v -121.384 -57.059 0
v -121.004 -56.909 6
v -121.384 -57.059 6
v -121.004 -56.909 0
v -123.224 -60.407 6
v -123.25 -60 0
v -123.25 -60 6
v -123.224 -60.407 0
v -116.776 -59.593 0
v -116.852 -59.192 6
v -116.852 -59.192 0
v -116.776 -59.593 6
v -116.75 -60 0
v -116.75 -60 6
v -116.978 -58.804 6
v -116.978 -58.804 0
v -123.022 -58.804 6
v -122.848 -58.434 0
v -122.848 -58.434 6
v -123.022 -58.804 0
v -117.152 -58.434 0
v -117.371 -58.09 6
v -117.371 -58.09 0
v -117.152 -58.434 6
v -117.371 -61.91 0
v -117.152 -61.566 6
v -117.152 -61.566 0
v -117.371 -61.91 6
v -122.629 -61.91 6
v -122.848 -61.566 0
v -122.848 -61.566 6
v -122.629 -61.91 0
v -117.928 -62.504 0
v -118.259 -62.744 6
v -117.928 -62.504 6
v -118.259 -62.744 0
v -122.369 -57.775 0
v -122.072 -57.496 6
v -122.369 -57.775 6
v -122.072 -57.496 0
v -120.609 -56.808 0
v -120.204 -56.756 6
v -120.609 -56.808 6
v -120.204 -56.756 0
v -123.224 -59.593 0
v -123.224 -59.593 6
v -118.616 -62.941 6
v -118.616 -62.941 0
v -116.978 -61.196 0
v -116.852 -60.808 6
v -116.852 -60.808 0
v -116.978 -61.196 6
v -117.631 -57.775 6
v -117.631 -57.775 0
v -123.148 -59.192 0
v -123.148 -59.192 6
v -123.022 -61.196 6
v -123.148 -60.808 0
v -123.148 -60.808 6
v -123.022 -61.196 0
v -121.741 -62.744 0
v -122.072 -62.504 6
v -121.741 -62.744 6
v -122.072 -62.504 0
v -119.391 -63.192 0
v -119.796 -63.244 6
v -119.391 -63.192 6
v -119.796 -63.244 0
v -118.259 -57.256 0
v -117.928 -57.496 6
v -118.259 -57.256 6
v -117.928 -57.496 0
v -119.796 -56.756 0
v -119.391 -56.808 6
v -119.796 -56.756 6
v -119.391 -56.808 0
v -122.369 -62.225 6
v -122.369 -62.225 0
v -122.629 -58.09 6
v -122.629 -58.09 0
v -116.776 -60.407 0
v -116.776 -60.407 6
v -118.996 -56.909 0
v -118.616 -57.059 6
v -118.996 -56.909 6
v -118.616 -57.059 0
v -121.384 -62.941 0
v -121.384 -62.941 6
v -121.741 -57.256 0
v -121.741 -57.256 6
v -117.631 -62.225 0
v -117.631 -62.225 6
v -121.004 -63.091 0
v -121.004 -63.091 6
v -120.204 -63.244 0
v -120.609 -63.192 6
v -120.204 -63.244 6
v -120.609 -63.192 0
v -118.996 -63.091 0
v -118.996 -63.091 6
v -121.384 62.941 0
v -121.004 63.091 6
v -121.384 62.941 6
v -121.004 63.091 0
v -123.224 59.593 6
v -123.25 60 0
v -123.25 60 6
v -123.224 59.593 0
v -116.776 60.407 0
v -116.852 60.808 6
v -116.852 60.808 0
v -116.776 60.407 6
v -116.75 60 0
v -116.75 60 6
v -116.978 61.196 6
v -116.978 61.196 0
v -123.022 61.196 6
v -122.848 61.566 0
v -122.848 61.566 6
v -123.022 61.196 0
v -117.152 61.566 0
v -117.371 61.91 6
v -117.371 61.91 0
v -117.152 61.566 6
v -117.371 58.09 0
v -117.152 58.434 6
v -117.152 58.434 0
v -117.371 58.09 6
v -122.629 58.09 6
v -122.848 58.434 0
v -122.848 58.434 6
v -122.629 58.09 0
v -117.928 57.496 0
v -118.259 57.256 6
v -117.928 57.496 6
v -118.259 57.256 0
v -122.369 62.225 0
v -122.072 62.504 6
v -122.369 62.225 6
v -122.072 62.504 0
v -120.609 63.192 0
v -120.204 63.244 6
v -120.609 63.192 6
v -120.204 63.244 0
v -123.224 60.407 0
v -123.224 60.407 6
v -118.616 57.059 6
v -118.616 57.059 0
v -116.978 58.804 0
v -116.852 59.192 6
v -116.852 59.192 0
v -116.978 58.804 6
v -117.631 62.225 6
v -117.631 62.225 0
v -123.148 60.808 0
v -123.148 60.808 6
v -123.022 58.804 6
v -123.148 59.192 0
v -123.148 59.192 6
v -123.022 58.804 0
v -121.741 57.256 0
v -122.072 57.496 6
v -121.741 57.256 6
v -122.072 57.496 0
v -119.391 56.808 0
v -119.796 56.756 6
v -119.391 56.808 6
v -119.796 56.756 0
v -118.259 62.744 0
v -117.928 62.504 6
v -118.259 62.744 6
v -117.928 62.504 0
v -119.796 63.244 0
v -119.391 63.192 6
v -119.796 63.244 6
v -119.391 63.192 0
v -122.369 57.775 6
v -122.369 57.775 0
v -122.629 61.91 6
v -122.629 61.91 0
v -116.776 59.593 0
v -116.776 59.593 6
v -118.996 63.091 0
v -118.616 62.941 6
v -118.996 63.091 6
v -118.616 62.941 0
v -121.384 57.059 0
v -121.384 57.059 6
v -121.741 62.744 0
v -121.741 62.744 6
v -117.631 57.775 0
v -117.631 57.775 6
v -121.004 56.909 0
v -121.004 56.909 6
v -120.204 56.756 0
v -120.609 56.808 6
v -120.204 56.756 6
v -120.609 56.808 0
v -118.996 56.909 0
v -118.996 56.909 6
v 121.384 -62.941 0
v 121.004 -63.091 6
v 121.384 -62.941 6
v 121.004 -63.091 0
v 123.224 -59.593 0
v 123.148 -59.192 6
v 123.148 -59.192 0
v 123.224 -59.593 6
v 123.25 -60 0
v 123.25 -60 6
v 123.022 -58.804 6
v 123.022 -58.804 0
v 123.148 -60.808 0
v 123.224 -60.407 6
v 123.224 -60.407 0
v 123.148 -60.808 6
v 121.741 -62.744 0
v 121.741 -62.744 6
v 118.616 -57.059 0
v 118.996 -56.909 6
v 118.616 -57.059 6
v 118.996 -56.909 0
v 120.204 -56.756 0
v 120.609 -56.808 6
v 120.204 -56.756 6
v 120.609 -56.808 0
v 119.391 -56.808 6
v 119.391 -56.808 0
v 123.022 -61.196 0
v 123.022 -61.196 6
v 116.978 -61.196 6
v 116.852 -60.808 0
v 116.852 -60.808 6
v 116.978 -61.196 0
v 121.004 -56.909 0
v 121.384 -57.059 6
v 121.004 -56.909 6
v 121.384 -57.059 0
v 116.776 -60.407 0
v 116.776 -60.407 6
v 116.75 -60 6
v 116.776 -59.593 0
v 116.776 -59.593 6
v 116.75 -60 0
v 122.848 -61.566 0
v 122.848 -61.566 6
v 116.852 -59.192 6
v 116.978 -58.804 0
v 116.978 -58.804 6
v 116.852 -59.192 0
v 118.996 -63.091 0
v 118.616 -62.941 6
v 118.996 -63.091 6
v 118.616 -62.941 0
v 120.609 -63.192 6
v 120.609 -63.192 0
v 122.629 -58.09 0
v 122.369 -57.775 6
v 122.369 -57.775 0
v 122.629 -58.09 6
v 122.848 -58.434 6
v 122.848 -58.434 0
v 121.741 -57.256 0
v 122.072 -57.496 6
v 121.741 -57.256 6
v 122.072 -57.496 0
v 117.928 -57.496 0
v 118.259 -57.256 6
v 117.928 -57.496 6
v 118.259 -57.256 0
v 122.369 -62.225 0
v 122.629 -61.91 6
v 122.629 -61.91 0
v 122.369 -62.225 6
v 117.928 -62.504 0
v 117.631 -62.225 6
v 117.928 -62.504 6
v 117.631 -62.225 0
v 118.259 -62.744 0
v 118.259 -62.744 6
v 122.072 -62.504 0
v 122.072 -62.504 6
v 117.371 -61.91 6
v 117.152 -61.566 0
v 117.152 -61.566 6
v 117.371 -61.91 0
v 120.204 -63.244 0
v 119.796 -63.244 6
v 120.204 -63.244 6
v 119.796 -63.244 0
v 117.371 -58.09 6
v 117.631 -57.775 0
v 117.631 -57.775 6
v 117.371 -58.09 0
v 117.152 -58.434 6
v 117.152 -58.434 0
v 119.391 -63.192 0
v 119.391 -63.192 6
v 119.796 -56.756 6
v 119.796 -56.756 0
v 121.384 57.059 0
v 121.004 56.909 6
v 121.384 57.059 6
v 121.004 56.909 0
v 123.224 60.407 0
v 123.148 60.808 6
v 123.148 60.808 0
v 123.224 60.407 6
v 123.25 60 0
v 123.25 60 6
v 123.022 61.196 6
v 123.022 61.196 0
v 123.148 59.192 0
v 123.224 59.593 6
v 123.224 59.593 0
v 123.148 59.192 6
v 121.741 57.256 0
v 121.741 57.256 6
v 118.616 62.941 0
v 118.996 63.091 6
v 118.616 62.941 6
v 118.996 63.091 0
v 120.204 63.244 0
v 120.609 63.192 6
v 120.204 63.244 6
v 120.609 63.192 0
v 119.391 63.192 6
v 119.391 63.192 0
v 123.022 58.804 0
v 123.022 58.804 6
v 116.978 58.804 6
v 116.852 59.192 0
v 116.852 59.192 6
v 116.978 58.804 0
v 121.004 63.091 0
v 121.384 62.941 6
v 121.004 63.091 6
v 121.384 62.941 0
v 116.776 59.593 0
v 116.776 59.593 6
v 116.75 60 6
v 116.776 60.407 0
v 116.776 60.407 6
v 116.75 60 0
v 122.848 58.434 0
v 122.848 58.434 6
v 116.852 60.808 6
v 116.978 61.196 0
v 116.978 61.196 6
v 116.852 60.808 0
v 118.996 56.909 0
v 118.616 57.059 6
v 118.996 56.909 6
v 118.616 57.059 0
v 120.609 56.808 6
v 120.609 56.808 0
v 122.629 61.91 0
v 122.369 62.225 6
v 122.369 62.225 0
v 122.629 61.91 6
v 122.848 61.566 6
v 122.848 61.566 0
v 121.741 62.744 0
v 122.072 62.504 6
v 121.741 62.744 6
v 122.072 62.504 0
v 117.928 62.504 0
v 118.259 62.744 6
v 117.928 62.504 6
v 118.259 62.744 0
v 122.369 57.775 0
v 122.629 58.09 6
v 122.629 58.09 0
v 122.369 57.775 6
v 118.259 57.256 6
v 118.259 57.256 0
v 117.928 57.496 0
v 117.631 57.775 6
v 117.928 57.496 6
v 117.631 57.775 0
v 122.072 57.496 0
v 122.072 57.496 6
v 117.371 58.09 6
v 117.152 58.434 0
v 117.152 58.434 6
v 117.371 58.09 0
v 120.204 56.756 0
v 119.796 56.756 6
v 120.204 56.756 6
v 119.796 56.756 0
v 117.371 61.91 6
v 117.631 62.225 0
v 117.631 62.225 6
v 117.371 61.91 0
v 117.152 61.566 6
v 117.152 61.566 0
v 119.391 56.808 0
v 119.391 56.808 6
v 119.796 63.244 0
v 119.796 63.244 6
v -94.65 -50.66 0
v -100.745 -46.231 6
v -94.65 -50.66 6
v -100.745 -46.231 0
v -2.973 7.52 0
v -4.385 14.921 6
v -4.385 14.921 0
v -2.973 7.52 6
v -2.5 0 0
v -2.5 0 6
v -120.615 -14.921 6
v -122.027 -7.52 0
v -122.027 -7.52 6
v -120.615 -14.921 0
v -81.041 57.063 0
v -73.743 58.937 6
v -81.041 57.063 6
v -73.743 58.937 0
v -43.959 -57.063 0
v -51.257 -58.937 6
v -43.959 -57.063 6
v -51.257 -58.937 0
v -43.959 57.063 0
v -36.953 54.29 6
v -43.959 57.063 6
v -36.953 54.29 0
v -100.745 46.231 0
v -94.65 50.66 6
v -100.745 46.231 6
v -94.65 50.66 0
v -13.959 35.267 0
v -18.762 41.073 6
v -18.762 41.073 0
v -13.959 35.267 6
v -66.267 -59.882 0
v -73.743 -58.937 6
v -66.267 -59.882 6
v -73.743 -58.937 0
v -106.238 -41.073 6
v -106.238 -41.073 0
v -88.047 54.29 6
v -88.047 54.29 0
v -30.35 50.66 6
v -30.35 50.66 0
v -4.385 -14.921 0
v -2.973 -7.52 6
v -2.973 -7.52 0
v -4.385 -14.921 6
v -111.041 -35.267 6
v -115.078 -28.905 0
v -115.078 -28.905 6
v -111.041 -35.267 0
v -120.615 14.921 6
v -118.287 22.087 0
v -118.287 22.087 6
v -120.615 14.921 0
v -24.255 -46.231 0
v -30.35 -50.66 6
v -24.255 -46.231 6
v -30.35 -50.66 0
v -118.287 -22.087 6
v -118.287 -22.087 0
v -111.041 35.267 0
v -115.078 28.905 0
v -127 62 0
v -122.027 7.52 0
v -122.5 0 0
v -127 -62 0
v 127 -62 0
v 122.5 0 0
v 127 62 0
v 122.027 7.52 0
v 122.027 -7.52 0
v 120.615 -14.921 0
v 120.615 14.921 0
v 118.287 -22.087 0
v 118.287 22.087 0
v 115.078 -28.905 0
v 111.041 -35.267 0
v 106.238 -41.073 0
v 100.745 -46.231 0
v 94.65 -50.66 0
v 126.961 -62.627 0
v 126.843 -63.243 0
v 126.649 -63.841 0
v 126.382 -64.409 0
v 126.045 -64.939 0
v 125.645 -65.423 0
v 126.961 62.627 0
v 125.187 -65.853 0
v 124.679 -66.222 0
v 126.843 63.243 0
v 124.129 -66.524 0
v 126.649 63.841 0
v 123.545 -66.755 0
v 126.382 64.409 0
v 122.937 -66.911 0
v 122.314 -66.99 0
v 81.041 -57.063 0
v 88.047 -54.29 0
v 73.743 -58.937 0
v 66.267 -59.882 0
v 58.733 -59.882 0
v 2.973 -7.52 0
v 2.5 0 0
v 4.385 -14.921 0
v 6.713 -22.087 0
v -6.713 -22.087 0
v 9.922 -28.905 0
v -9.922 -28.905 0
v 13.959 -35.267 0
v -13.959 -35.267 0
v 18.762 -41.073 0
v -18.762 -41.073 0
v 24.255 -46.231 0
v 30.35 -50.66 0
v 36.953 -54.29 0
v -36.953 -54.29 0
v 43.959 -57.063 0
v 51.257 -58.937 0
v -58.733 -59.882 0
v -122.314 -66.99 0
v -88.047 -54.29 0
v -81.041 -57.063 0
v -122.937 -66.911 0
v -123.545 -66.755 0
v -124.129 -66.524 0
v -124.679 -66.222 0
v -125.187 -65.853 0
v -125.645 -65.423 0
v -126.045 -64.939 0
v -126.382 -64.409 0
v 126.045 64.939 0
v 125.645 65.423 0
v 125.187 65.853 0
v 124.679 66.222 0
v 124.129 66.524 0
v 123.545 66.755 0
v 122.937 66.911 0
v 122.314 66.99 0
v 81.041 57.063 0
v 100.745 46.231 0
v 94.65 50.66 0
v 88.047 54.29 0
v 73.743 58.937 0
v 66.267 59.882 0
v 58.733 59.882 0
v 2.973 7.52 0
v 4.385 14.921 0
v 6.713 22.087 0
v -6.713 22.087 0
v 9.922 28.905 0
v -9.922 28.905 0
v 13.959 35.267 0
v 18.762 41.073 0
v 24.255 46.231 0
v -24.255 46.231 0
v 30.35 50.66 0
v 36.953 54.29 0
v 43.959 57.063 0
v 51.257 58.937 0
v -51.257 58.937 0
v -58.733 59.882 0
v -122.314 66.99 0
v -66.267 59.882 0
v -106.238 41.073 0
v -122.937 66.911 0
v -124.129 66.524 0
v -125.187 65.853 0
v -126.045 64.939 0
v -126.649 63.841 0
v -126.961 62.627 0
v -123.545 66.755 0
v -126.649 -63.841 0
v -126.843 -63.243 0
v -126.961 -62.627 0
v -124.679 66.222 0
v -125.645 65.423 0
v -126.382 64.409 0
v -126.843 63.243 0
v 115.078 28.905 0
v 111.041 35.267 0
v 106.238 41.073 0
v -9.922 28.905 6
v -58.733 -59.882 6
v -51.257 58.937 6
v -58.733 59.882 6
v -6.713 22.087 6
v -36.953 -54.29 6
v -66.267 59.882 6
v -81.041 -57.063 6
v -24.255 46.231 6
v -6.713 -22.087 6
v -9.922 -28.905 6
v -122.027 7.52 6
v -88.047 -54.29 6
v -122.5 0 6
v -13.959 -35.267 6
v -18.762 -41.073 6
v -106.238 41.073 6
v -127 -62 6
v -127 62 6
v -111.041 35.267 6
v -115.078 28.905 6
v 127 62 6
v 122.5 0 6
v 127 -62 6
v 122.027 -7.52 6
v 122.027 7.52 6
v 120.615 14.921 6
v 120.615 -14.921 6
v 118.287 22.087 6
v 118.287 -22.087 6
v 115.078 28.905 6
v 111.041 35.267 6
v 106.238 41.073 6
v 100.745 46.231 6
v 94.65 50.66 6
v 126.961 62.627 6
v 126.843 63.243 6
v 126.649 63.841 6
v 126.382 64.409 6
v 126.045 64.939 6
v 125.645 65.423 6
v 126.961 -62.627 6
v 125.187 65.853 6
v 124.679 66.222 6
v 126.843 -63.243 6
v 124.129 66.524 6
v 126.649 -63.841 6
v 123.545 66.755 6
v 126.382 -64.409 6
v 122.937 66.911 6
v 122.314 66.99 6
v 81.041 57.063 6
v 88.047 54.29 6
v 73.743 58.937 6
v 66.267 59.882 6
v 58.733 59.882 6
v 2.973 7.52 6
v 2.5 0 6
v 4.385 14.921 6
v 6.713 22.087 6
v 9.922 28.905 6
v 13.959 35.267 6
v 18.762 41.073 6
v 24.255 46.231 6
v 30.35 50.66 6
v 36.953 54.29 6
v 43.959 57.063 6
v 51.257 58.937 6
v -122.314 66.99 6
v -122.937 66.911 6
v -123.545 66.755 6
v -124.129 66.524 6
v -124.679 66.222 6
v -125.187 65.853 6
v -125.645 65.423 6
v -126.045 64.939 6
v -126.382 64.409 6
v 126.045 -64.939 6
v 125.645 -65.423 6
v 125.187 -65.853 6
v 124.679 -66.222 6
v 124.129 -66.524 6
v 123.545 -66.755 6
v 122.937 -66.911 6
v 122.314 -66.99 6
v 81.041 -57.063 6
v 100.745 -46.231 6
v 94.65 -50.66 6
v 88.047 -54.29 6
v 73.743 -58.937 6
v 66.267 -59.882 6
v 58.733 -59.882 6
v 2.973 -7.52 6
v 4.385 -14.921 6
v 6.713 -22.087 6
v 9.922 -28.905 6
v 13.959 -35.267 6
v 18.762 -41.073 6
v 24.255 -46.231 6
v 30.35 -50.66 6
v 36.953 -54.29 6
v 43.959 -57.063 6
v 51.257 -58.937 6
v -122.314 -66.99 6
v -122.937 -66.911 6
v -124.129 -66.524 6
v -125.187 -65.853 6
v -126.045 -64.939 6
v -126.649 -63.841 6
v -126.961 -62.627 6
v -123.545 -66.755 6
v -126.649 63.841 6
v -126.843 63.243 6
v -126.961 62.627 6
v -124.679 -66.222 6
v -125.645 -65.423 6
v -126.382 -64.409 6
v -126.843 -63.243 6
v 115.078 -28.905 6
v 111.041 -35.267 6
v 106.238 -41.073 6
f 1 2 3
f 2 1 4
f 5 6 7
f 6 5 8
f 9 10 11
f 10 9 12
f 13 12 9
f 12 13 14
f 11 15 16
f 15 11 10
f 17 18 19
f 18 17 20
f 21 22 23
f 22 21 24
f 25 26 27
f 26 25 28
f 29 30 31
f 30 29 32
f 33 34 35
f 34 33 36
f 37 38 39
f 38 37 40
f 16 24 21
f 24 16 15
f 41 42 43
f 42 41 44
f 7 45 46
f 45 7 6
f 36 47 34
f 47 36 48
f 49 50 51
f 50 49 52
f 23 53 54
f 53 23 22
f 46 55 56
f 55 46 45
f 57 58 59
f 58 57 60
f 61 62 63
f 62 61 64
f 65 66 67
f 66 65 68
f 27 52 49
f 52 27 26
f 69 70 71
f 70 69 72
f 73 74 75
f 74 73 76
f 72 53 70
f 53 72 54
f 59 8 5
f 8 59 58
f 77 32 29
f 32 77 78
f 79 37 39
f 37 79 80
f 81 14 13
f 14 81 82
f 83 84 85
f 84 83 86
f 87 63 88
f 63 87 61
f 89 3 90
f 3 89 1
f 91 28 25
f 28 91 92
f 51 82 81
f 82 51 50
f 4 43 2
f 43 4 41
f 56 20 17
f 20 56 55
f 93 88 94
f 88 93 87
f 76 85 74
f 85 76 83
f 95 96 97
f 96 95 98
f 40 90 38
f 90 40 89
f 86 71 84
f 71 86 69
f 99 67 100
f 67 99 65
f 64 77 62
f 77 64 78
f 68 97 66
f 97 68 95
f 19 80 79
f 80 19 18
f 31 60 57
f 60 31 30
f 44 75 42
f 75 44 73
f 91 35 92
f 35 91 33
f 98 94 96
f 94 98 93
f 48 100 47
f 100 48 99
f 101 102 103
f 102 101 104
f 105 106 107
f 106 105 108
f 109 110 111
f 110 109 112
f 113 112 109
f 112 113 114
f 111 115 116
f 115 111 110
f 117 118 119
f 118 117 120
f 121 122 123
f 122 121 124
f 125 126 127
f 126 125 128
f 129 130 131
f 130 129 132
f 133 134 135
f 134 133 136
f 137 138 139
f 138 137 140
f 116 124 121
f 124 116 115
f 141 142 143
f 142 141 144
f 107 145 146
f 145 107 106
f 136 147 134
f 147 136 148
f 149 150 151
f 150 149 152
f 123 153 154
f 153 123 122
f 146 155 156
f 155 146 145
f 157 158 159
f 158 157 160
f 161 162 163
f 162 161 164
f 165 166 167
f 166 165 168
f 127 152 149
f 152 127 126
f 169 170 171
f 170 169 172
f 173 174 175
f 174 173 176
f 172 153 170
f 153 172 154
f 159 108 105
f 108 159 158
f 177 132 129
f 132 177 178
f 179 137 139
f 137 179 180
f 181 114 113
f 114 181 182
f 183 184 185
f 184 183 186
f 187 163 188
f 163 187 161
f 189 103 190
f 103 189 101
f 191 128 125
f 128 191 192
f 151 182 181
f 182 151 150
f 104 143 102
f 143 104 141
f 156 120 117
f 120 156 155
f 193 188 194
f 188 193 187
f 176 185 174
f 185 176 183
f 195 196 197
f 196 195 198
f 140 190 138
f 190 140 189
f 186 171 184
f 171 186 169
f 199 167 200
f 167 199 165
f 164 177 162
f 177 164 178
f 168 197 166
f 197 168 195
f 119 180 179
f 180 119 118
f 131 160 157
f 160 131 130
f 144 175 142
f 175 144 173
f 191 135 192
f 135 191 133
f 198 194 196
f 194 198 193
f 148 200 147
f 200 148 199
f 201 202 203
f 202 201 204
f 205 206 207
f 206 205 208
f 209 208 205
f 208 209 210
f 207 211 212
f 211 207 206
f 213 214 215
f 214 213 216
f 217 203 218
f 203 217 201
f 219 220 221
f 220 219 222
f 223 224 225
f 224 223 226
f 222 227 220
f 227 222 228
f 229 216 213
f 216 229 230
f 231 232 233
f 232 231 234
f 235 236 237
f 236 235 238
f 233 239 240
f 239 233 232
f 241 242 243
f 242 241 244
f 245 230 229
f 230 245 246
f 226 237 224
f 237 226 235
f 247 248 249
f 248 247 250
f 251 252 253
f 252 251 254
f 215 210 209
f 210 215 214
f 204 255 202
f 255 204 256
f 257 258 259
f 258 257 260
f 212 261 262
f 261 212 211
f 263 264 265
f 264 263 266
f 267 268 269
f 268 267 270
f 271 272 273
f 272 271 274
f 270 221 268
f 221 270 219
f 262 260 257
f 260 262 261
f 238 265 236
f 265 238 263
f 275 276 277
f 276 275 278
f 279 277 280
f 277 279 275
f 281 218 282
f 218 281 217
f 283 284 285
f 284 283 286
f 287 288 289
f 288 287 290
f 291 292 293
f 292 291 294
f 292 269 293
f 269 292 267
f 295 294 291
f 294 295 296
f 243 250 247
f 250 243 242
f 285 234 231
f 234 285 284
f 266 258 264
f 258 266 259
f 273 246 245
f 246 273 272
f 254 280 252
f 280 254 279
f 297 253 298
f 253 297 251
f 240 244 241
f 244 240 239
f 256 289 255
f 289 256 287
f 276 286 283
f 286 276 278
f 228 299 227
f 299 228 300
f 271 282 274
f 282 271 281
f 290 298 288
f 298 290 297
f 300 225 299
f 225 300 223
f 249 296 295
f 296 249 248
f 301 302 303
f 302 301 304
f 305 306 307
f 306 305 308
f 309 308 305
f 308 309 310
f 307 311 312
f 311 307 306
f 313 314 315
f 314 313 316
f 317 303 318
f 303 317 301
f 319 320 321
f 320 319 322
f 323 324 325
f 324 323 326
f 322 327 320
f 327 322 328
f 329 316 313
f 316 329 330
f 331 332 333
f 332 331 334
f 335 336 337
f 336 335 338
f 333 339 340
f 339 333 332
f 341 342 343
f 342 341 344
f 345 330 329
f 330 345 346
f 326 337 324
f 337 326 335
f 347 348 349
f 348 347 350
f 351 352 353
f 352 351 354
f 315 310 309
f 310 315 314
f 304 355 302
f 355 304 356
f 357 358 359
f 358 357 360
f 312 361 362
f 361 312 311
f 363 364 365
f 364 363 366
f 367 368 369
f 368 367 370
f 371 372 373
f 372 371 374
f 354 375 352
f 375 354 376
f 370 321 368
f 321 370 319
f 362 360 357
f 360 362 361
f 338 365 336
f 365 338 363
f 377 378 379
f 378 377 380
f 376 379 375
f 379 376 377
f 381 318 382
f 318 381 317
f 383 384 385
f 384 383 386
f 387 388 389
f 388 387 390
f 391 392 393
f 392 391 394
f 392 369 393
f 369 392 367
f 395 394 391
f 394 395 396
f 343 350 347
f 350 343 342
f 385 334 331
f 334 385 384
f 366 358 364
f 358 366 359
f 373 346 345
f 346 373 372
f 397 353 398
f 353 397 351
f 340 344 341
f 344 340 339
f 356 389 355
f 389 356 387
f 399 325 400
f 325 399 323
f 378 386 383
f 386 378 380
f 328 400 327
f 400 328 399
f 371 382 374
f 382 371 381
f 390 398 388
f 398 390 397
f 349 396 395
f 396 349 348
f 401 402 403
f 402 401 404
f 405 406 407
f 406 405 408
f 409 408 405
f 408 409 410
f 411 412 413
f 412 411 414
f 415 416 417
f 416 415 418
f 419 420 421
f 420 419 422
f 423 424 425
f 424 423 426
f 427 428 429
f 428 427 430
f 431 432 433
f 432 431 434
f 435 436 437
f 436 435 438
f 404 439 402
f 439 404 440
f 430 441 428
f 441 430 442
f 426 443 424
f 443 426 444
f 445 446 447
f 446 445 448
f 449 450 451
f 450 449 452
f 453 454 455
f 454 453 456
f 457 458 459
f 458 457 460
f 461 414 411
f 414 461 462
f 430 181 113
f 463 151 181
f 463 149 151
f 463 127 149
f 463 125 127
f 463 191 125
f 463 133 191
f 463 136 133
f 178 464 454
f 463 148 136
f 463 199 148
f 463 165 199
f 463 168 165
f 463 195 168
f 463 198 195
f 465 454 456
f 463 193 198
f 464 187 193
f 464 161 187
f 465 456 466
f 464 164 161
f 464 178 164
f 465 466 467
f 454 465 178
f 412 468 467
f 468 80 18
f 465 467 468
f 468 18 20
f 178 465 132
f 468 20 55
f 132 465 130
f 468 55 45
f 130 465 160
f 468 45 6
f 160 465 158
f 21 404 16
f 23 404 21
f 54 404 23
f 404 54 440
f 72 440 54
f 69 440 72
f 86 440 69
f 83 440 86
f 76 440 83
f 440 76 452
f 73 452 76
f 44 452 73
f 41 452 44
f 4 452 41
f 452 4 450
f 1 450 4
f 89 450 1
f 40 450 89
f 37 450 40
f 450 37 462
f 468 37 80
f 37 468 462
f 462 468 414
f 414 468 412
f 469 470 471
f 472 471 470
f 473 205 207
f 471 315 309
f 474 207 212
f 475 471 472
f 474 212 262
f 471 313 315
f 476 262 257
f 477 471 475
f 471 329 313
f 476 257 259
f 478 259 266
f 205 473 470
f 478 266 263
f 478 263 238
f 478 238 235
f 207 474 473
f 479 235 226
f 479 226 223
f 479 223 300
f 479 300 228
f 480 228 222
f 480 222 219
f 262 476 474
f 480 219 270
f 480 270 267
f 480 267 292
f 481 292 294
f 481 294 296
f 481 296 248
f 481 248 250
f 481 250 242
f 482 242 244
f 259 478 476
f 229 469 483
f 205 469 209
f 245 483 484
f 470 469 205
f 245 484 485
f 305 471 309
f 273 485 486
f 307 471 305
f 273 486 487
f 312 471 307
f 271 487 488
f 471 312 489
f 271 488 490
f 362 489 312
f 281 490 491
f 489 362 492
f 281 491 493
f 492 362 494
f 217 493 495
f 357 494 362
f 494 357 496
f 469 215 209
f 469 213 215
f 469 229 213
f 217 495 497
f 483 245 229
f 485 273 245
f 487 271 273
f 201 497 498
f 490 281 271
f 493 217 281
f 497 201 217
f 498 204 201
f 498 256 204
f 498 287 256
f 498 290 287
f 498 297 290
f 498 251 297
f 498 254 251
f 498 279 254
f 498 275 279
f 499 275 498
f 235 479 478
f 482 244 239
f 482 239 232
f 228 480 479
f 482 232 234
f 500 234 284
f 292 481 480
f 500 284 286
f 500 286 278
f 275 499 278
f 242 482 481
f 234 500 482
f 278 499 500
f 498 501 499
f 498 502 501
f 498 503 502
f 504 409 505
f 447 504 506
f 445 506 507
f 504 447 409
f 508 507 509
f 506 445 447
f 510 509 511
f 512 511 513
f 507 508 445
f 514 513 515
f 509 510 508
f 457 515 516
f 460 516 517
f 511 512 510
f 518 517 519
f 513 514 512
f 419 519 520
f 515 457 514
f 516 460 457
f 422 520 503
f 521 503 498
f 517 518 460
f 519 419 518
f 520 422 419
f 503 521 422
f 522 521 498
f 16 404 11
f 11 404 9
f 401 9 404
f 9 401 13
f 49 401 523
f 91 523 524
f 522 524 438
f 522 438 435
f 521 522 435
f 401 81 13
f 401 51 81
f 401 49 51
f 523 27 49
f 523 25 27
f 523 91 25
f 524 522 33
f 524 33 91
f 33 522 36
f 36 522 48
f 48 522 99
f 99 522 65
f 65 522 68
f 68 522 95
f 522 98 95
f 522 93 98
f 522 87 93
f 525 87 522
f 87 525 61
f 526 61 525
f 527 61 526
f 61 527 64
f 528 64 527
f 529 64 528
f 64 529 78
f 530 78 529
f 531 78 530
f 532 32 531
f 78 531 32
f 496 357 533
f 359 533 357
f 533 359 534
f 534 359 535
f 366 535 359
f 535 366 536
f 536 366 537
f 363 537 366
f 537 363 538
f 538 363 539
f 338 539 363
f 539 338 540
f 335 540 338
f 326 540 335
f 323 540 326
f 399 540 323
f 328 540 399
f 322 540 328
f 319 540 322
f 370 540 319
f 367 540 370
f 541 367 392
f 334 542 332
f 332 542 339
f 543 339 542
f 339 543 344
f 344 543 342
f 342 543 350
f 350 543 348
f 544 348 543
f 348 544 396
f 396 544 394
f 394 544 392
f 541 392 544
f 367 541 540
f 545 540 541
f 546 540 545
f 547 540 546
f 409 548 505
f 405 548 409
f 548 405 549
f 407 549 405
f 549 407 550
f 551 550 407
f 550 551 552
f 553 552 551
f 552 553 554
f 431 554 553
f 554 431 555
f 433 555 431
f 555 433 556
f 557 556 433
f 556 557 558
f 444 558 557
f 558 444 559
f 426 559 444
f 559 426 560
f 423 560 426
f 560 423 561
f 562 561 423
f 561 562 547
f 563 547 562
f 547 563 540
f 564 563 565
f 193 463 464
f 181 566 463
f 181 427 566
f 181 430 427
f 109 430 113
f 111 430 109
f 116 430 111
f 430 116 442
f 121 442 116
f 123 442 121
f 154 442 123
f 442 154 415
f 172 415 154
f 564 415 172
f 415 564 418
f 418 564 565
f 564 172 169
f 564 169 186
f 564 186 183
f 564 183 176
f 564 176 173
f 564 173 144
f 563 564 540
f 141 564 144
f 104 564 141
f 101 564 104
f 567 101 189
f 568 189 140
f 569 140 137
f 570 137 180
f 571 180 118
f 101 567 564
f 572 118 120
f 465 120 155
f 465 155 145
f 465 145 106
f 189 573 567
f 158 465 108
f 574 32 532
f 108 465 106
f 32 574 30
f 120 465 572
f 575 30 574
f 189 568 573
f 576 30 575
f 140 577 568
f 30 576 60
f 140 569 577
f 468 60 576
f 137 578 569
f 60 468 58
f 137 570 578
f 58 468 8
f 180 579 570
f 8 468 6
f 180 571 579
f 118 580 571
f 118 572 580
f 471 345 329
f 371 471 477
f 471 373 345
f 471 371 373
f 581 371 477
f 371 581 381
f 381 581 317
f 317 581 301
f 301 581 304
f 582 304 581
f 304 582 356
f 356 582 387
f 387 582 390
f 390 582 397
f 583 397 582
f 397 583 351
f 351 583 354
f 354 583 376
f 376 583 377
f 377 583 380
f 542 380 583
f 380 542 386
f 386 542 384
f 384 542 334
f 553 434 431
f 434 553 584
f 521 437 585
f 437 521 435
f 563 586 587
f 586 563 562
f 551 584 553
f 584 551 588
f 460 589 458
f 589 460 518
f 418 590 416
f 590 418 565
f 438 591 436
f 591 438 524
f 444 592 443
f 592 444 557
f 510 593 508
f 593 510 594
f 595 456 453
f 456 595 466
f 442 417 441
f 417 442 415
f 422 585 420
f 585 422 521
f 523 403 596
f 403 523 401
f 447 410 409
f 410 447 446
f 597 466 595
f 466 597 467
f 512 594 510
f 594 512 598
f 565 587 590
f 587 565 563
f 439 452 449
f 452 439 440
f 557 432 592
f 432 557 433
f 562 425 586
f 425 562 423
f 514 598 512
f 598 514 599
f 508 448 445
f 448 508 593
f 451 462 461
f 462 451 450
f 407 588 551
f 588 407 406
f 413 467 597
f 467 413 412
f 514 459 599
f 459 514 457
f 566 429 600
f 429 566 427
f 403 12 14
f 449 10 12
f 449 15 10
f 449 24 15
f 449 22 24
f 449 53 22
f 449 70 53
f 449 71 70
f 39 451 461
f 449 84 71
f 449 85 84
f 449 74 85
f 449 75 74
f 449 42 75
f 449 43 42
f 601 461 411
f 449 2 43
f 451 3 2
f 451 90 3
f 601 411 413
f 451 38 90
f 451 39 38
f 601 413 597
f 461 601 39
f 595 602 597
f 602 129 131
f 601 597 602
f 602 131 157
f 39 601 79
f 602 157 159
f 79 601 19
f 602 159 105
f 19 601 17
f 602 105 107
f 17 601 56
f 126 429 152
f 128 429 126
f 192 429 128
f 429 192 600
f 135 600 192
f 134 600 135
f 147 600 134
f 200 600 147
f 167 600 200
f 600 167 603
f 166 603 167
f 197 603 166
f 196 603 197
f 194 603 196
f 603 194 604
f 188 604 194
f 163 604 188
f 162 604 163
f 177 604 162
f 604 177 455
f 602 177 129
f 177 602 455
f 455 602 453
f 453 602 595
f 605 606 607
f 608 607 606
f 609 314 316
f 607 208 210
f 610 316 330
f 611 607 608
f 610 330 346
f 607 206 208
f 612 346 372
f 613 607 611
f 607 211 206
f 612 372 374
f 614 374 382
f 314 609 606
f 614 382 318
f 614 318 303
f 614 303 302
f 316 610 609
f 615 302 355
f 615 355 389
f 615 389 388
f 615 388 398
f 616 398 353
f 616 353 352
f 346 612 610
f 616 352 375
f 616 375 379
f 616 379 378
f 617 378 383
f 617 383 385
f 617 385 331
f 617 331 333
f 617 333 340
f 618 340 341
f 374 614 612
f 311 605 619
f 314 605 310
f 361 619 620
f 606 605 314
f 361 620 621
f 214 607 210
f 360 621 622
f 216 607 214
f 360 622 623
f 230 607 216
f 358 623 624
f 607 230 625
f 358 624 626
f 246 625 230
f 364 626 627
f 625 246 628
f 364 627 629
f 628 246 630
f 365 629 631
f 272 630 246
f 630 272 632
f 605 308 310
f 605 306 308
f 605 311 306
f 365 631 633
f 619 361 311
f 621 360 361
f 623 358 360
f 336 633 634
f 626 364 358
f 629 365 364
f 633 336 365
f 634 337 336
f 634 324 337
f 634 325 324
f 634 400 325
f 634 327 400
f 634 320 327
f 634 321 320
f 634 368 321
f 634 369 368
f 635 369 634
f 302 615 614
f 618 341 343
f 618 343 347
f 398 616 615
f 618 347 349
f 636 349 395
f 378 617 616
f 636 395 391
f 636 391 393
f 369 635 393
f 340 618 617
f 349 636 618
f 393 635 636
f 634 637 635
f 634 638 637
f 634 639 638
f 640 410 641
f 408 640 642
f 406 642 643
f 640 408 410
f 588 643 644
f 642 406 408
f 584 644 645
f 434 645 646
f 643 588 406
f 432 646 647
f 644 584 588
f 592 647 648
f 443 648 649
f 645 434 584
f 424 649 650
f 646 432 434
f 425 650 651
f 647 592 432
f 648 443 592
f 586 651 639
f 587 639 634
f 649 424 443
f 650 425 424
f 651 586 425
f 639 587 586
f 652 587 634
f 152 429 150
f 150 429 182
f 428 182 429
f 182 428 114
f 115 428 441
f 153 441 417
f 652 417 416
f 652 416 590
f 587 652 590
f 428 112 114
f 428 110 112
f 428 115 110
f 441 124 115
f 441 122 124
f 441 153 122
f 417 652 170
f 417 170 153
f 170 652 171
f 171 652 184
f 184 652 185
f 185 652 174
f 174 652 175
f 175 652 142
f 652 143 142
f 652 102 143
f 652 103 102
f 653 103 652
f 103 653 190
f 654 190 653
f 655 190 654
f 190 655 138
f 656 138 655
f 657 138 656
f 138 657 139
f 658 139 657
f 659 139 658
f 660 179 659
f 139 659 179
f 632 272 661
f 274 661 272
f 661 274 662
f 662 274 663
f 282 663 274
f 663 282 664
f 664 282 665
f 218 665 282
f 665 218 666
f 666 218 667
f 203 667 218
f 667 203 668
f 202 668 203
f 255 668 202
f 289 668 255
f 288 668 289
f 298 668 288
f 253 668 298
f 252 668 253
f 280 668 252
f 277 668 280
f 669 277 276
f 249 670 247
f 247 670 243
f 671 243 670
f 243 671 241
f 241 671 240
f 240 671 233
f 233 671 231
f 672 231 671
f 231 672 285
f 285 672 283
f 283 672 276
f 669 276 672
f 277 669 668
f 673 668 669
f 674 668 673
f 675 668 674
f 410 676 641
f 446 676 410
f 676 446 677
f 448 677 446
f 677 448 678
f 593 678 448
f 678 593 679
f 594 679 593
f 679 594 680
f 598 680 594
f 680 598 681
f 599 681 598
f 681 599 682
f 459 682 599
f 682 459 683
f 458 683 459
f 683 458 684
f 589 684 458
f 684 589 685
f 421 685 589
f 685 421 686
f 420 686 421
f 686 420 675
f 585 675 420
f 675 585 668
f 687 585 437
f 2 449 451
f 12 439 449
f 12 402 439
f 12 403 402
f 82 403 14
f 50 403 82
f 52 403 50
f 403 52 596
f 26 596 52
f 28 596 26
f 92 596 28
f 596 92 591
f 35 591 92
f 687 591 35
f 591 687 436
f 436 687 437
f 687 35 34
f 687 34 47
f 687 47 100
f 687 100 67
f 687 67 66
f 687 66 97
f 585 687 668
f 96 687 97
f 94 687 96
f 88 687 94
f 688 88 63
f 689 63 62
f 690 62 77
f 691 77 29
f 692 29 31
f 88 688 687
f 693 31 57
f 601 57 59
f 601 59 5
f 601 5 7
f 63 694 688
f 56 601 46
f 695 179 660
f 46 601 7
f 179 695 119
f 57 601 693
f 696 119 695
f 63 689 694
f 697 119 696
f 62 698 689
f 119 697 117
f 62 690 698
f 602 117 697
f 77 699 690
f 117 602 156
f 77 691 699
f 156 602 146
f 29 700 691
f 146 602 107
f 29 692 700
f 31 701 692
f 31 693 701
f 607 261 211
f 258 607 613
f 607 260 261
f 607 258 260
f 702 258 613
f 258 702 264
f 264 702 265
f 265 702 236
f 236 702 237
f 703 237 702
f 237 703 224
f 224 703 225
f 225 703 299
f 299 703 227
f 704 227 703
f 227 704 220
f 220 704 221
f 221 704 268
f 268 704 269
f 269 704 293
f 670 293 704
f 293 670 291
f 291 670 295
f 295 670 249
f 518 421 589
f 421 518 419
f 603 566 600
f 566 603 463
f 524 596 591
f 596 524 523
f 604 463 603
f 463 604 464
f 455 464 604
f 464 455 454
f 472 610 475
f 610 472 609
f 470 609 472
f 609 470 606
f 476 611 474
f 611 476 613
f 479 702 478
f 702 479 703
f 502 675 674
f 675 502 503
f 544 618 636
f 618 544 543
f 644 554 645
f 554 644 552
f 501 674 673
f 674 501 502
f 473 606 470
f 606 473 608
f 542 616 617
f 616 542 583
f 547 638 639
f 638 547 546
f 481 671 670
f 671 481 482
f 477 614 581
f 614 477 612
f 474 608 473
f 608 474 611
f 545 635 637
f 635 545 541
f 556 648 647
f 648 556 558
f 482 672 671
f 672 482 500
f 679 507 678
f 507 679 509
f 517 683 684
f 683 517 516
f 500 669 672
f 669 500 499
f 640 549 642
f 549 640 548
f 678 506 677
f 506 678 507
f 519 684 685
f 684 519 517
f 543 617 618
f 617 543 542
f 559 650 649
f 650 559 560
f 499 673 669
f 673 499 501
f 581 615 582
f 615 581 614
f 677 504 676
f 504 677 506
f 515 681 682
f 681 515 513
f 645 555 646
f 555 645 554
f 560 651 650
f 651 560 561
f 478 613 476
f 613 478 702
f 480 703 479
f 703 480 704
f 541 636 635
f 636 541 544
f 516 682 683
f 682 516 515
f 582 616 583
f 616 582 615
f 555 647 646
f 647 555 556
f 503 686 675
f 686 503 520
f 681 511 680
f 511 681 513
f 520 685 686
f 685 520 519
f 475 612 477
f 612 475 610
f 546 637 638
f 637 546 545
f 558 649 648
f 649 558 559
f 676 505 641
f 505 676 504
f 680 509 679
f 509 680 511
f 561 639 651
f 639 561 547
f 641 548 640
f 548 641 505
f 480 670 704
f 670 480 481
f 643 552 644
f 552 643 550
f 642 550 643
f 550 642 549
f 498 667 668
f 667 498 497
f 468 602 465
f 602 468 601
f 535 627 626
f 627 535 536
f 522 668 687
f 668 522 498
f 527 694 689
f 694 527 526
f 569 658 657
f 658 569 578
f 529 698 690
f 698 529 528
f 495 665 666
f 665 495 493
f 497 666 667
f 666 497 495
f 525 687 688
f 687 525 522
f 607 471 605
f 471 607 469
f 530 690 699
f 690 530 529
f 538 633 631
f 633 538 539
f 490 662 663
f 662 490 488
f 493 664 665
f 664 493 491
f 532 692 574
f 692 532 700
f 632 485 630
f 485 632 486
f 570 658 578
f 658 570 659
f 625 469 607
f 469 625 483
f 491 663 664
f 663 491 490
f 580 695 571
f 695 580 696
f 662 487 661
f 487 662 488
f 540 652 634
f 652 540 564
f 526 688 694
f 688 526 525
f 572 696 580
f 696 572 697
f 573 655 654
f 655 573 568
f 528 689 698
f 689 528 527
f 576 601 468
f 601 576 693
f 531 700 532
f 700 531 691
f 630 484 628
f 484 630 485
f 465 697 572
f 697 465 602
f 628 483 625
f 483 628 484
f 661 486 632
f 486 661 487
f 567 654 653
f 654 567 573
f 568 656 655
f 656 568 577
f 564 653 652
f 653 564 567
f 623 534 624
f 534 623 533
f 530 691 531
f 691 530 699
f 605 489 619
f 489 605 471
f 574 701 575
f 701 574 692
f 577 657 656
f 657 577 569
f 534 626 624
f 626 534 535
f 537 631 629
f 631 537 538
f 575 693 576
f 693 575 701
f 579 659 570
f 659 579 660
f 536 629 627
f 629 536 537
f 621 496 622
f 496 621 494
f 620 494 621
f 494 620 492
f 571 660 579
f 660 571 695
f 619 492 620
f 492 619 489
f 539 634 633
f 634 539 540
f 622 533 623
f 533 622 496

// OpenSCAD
$fn = 50;


difference() {
	union() {
		hull() {
			translate(v = [-122.0000000000, 62.0000000000, 0]) {
				cylinder(h = 6, r = 5);
			}
			translate(v = [122.0000000000, 62.0000000000, 0]) {
				cylinder(h = 6, r = 5);
			}
			translate(v = [-122.0000000000, -62.0000000000, 0]) {
				cylinder(h = 6, r = 5);
			}
			translate(v = [122.0000000000, -62.0000000000, 0]) {
				cylinder(h = 6, r = 5);
			}
		}
	}
	union() {
		#translate(v = [-120.0000000000, -60.0000000000, -100.0000000000]) {
			cylinder(h = 200, r = 3.2500000000);
		}
		#translate(v = [-120.0000000000, 60.0000000000, -100.0000000000]) {
			cylinder(h = 200, r = 3.2500000000);
		}
		#translate(v = [120.0000000000, -60.0000000000, -100.0000000000]) {
			cylinder(h = 200, r = 3.2500000000);
		}
		#translate(v = [120.0000000000, 60.0000000000, -100.0000000000]) {
			cylinder(h = 200, r = 3.2500000000);
		}
		#translate(v = [-62.5000000000, 0, 0]) {
			cylinder(h = 6, r = 60.0000000000);
		}
		#translate(v = [62.5000000000, 0, 0]) {
			cylinder(h = 6, r = 60.0000000000);
		}
	}
}
